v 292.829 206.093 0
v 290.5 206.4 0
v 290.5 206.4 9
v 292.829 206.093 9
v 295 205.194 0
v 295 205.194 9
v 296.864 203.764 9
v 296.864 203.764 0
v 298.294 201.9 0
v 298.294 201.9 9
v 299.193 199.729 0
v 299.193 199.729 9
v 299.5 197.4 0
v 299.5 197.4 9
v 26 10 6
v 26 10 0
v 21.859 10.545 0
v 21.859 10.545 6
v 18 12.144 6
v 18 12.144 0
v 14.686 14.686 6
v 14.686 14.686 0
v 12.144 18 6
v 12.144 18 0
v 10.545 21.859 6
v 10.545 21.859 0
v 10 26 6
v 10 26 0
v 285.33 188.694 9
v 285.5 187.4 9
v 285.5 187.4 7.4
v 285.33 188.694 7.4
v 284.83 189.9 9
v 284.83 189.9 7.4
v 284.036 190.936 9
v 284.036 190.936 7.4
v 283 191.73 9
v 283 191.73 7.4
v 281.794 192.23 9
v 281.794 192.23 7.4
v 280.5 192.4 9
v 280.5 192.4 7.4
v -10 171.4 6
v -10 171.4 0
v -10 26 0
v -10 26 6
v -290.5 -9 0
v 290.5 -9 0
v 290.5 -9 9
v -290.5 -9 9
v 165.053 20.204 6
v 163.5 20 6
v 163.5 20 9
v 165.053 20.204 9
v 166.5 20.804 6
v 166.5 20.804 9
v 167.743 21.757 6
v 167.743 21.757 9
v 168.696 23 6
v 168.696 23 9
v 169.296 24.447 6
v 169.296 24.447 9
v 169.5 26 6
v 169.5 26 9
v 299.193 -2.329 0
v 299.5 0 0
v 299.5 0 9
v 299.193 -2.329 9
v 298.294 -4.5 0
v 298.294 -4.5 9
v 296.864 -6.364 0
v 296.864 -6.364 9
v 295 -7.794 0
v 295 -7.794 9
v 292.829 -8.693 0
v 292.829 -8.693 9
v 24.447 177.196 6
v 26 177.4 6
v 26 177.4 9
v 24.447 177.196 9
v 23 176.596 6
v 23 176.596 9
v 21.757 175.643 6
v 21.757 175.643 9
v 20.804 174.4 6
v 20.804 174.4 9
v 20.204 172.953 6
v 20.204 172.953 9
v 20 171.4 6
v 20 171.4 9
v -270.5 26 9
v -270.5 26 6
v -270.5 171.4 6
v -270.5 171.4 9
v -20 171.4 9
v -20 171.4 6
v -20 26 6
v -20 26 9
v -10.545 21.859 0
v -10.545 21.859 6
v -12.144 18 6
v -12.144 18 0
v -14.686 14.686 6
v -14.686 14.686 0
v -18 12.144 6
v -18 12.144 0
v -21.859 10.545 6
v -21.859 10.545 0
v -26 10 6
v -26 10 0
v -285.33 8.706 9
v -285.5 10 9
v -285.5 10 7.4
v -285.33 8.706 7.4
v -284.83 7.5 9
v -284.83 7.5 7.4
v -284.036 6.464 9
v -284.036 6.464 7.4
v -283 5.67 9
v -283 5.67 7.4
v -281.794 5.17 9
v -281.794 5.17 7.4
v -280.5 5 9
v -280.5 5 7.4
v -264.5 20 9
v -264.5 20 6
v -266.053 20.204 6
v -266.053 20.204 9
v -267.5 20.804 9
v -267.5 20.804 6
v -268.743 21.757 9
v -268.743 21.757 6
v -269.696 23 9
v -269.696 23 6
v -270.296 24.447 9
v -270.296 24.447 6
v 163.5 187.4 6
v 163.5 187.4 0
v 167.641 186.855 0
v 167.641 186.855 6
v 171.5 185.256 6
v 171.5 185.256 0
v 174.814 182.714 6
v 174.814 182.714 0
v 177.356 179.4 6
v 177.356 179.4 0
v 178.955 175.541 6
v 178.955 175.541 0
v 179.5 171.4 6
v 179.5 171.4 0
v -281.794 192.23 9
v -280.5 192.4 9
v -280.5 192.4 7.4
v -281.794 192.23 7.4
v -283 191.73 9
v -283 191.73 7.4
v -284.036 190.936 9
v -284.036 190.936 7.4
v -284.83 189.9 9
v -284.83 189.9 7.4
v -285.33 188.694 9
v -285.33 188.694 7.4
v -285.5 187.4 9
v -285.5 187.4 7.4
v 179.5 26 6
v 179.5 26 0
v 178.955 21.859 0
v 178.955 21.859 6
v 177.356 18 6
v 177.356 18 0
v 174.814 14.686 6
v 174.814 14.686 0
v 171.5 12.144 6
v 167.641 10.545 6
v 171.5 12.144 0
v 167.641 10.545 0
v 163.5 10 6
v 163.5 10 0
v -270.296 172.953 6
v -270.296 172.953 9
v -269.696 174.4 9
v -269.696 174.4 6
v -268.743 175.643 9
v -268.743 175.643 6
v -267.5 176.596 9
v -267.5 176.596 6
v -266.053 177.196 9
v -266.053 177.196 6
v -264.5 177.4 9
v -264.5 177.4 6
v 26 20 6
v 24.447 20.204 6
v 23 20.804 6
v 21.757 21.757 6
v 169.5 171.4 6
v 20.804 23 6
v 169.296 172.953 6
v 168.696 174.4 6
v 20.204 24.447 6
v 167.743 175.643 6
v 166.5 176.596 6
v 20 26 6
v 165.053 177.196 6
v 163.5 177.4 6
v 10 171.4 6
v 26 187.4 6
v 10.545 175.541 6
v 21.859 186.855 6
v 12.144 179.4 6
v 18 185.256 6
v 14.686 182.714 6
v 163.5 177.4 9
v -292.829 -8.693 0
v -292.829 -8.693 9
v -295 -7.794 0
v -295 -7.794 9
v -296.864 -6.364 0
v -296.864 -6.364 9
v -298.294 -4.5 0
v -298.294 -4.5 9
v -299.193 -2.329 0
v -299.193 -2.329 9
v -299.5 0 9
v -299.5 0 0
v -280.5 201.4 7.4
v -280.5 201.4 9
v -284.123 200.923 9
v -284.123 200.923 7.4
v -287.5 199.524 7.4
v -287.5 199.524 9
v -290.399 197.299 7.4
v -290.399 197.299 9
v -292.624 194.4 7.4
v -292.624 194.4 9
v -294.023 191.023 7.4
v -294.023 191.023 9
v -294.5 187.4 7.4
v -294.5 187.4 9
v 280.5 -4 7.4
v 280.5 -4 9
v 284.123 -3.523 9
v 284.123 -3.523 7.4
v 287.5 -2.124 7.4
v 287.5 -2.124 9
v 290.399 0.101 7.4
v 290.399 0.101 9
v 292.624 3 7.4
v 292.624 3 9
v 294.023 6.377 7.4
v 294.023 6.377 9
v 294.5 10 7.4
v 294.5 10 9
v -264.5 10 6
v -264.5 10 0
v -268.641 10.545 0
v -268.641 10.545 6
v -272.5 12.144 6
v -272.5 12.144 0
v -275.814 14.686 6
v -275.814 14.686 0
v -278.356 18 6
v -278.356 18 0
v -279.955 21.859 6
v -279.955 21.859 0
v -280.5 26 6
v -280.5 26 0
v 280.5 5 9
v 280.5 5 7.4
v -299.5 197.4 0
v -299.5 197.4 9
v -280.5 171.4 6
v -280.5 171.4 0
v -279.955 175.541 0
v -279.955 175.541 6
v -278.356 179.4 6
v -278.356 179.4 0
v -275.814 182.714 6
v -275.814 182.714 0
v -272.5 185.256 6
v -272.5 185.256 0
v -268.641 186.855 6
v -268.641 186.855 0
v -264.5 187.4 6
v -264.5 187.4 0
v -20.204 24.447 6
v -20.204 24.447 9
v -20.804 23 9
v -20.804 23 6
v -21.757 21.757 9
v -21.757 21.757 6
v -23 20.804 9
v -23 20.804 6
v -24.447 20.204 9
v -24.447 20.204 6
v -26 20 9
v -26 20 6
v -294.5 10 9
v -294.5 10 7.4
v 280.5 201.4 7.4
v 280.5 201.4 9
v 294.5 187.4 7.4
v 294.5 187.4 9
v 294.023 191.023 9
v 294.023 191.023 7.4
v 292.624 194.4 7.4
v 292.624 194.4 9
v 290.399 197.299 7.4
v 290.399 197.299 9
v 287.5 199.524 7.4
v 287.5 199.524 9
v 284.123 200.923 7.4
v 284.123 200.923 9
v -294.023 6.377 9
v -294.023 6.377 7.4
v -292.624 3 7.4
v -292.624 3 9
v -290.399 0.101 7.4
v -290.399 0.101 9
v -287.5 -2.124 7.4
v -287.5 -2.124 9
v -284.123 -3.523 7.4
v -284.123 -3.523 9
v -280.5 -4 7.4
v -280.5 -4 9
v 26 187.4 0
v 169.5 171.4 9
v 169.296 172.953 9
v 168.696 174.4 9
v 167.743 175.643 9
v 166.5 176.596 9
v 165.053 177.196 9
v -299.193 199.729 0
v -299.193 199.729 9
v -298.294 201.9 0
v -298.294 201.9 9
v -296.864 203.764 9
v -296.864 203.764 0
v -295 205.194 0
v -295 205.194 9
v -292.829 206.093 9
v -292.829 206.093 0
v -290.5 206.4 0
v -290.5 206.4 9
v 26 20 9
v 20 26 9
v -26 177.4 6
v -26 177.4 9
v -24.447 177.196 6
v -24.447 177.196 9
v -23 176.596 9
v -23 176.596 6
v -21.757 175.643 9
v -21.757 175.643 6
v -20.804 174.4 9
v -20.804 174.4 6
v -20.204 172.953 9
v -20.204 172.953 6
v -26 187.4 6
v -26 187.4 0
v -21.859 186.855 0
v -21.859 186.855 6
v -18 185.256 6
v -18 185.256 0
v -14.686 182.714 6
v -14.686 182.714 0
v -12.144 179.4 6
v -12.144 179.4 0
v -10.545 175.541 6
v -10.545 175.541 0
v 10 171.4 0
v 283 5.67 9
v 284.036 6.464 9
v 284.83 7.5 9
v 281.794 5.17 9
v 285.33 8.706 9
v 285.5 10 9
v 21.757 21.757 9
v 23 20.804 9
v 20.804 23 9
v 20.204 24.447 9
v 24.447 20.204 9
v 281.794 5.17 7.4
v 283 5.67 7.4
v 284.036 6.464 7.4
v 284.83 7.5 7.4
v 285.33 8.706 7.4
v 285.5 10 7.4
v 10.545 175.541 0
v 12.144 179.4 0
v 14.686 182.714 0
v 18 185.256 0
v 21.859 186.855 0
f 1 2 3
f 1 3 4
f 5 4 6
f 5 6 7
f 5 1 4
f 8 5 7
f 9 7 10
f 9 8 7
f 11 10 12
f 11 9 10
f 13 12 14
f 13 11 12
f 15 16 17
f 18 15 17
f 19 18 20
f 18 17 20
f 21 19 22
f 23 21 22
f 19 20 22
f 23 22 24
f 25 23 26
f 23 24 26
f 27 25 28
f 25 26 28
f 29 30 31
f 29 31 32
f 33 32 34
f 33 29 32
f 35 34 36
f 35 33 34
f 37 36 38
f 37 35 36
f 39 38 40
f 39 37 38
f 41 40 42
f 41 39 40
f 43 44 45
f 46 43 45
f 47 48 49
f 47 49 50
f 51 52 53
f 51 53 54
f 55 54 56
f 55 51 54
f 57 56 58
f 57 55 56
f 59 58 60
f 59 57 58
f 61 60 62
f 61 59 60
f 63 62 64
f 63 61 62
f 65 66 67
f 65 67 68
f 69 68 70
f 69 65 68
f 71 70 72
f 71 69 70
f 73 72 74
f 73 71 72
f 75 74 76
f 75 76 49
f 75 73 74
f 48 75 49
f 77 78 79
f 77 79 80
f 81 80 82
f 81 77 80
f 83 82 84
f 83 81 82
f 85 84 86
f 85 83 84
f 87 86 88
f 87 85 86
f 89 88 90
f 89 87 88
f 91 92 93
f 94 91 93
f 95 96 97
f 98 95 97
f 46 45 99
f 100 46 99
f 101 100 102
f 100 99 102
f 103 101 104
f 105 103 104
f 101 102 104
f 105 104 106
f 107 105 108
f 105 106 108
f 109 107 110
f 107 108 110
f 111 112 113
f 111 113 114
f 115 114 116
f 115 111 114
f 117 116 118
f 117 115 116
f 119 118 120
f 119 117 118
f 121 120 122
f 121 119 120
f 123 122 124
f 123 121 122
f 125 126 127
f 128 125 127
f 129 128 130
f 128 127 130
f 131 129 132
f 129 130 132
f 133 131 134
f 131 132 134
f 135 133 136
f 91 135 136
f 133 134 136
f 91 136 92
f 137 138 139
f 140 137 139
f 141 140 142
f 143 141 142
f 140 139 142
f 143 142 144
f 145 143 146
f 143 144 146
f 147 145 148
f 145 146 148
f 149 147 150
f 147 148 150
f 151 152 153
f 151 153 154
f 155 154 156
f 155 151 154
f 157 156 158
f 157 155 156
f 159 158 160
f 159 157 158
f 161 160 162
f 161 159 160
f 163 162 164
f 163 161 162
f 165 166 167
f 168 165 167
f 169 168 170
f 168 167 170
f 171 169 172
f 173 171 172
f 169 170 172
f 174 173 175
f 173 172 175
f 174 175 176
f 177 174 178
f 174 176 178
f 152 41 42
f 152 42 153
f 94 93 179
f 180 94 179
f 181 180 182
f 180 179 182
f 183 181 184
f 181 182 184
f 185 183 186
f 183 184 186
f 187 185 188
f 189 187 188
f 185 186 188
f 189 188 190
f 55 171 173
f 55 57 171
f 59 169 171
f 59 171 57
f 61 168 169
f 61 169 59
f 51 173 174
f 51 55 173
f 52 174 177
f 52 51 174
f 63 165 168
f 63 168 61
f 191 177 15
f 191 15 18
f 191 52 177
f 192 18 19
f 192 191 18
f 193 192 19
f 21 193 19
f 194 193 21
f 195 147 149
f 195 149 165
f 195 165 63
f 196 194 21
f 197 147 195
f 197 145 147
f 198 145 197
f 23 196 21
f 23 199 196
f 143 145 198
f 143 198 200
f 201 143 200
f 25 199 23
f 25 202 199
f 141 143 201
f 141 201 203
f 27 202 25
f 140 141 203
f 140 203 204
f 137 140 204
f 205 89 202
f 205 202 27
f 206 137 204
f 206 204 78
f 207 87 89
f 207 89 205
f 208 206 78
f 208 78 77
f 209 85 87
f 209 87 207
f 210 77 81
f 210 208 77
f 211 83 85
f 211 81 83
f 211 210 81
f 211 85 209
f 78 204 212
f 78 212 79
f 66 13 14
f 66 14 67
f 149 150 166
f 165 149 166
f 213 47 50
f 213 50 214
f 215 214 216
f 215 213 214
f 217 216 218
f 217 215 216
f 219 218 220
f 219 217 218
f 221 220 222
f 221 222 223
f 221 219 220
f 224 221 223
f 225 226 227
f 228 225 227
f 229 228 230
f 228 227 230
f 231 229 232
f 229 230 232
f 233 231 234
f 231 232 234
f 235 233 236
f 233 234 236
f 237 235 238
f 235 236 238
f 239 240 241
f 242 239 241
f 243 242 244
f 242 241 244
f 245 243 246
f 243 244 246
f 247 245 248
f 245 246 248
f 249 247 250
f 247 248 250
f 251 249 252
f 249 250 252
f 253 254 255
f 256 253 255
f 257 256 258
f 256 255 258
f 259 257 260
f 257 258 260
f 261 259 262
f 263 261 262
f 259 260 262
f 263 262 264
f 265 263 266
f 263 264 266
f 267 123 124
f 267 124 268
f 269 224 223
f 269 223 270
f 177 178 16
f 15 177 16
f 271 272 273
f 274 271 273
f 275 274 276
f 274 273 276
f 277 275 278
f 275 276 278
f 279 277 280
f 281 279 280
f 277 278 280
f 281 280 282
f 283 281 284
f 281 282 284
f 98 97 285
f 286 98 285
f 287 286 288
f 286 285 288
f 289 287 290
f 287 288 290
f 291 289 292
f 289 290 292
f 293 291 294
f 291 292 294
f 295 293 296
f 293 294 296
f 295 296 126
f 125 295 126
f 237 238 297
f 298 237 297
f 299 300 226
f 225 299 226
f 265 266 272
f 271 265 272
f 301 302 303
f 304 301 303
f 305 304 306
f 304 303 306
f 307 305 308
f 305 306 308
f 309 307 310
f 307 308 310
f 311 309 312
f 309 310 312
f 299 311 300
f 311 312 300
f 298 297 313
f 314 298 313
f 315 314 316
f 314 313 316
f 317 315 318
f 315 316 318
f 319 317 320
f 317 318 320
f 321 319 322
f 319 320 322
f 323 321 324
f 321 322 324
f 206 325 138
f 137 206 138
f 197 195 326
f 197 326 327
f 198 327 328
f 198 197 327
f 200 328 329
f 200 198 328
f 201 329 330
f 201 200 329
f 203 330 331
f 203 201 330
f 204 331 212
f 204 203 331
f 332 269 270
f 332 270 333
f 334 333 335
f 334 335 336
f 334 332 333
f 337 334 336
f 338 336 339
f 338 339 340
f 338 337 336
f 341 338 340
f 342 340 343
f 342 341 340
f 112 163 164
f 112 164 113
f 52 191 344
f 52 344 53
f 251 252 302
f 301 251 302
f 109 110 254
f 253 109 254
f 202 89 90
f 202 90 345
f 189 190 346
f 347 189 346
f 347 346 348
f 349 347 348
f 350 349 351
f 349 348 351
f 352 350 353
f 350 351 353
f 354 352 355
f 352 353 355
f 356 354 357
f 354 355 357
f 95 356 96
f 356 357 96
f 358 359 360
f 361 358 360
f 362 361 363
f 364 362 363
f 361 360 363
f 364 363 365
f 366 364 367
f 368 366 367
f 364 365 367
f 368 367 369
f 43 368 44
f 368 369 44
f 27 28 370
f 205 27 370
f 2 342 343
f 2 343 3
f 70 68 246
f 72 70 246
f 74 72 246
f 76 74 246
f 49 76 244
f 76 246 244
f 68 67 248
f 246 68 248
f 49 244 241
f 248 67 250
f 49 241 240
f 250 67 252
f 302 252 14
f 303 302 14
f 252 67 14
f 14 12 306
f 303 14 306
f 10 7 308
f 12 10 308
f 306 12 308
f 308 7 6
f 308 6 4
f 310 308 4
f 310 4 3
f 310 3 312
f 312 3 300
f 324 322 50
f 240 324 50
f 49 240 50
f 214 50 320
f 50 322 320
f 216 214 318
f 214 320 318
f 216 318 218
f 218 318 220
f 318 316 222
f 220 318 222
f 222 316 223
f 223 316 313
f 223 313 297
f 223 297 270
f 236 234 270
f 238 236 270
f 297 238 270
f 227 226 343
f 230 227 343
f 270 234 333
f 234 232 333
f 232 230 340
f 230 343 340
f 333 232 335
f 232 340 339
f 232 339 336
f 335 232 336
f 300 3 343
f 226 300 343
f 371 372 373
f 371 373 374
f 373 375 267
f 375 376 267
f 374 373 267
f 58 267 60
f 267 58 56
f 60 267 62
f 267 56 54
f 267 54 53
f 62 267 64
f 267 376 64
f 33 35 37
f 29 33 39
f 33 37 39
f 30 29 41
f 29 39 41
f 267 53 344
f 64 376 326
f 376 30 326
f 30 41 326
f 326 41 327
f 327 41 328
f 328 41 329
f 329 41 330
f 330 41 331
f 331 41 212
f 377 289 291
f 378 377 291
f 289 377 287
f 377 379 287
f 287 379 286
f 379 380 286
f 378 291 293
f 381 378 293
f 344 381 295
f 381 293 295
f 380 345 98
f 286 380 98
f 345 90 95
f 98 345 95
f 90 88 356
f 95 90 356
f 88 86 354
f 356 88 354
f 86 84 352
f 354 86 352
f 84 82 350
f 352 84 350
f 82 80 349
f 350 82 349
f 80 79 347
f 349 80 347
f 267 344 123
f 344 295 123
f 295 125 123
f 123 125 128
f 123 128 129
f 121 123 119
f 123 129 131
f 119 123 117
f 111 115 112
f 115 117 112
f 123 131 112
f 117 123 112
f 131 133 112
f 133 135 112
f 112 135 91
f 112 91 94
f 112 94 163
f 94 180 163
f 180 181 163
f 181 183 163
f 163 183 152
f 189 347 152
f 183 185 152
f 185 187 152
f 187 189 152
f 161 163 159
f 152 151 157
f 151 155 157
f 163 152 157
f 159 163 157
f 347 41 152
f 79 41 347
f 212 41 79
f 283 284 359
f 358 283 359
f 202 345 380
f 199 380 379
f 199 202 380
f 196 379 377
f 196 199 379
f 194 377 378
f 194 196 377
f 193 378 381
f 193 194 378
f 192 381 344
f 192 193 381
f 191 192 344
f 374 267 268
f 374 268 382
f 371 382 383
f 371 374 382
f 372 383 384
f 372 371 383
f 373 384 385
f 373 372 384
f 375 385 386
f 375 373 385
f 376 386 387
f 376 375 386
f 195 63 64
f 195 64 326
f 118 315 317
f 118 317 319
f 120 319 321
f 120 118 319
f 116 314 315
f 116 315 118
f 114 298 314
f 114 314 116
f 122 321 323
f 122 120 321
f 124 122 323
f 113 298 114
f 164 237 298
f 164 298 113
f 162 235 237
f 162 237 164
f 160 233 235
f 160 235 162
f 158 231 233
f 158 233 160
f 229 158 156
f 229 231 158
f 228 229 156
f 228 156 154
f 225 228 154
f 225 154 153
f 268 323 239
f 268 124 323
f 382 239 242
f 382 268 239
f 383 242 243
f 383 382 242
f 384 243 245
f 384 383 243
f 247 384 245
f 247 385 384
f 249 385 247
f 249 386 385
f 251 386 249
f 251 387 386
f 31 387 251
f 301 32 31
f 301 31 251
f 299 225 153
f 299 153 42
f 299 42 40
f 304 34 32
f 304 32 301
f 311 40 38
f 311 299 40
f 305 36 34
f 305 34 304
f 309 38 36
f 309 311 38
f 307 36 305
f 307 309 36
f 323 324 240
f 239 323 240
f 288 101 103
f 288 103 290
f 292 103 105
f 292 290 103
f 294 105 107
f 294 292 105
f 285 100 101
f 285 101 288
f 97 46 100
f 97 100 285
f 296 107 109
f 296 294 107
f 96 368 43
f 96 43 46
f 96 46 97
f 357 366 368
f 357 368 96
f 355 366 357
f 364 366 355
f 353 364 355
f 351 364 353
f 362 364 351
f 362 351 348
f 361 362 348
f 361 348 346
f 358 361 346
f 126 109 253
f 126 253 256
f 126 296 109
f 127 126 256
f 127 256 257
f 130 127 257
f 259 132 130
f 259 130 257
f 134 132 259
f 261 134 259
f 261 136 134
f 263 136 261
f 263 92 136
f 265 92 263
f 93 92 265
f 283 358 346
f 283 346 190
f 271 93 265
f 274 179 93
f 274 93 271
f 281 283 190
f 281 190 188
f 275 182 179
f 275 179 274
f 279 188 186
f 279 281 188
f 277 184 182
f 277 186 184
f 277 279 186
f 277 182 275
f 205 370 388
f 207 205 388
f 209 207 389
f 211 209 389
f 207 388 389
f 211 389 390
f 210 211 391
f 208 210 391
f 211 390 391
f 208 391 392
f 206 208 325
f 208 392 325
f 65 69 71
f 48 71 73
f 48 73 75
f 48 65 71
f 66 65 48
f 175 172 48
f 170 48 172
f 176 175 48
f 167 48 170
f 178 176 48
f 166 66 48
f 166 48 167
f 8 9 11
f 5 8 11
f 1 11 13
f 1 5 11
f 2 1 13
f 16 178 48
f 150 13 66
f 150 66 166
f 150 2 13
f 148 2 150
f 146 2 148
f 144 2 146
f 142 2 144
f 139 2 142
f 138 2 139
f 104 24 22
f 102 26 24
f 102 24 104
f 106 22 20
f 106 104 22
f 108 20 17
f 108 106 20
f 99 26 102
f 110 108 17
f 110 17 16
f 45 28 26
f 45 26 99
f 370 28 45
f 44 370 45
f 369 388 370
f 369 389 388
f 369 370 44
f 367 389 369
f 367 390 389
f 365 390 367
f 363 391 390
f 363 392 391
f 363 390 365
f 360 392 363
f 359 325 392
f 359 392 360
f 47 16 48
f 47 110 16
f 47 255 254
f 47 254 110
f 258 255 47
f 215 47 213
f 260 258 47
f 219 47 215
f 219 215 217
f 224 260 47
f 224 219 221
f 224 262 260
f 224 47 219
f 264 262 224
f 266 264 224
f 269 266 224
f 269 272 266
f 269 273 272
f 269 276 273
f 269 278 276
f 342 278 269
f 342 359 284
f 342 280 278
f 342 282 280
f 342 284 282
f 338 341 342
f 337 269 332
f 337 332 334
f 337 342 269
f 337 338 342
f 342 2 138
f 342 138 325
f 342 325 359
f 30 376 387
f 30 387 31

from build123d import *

# Parameters (mm, degrees)
BOSS_EXTRUDE1_DEPTH = 9
CUT_EXTRUDE1_DEPTH  = 1.6
CUT_EXTRUDE2_DEPTH  = 9
CUT_EXTRUDE4_DEPTH  = 6


with BuildPart() as part:
    # Sketch1 → Boss-Extrude1 (new body)
    with BuildSketch(Plane.XY):
        with BuildLine():
            Line((-290.5, 206.4), (290.5, 206.4))
            ThreePointArc((290.5, 206.4), (296.863961031, 203.763961031), (299.5, 197.4))
            Line((299.5, 197.4), (299.5, 0))
            ThreePointArc((299.5, 0), (296.863961031, -6.363961031), (290.5, -9))
            Line((290.5, -9), (-290.5, -9))
            ThreePointArc((-290.5, -9), (-296.863961031, -6.363961031), (-299.5, 0))
            Line((-299.5, 0), (-299.5, 197.4))
            ThreePointArc((-299.5, 197.4), (-296.863961031, 203.763961031), (-290.5, 206.4))
        make_face()
    extrude(amount=BOSS_EXTRUDE1_DEPTH)

    # Sketch4 → Cut-Extrude1 (cut)
    with BuildSketch(Plane.XY.offset(9)):
        with BuildLine():
            Line((-280.5, -4), (280.5, -4))
            ThreePointArc((280.5, -4), (290.399494937, 0.100505063), (294.5, 10))
            Line((294.5, 10), (294.5, 187.4))
            ThreePointArc((294.5, 187.4), (290.399494937, 197.299494937), (280.5, 201.4))
            Line((280.5, 201.4), (-280.5, 201.4))
            ThreePointArc((-280.5, 201.4), (-290.399494937, 197.299494937), (-294.5, 187.4))
            Line((-294.5, 187.4), (-294.5, 10))
            ThreePointArc((-294.5, 10), (-290.399494937, 0.100505063), (-280.5, -4))
        make_face()
        with BuildLine():
            Line((-280.5, 5), (280.5, 5))
            ThreePointArc((280.5, 5), (284.035533906, 6.464466094), (285.5, 10))
            Line((285.5, 10), (285.5, 187.4))
            ThreePointArc((285.5, 187.4), (284.035533906, 190.935533906), (280.5, 192.4))
            Line((280.5, 192.4), (-280.5, 192.4))
            ThreePointArc((-280.5, 192.4), (-284.035533906, 190.935533906), (-285.5, 187.4))
            Line((-285.5, 187.4), (-285.5, 10))
            ThreePointArc((-285.5, 10), (-284.035533906, 6.464466094), (-280.5, 5))
        make_face(mode=Mode.SUBTRACT)
    extrude(amount=-CUT_EXTRUDE1_DEPTH, mode=Mode.SUBTRACT)

    # Sketch5 → Cut-Extrude2 (cut)
    with BuildSketch(Plane.XY):
        with BuildLine():
            Line((-264.5, 177.4), (-26, 177.4))
            ThreePointArc((-26, 177.4), (-21.757359313, 175.642640687), (-20, 171.4))
            Line((-20, 171.4), (-20, 26))
            ThreePointArc((-20, 26), (-21.757359313, 21.757359313), (-26, 20))
            Line((-26, 20), (-264.5, 20))
            ThreePointArc((-264.5, 20), (-268.742640687, 21.757359313), (-270.5, 26))
            Line((-270.5, 26), (-270.5, 171.4))
            ThreePointArc((-270.5, 171.4), (-268.742640687, 175.642640687), (-264.5, 177.4))
        make_face()
        with BuildLine():
            Line((20, 171.4), (20, 26))
            ThreePointArc((20, 26), (21.757359313, 21.757359313), (26, 20))
            Line((26, 20), (163.5, 20))
            ThreePointArc((163.5, 20), (167.742640687, 21.757359313), (169.5, 26))
            Line((169.5, 26), (169.5, 171.4))
            ThreePointArc((169.5, 171.4), (167.742640687, 175.642640687), (163.5, 177.4))
            Line((163.5, 177.4), (26, 177.4))
            ThreePointArc((26, 177.4), (21.757359313, 175.642640687), (20, 171.4))
        make_face()
    extrude(amount=CUT_EXTRUDE2_DEPTH, mode=Mode.SUBTRACT)

    # Sketch7 → Cut-Extrude4 (cut)
    with BuildSketch(Plane(origin=(0, 0, 0), x_dir=(-1, 0, 0), z_dir=(0, 0, -1))):
        with BuildLine():
            Line((280.5, 26), (280.5, 171.4))
            ThreePointArc((280.5, 171.4), (275.813708499, 182.713708499), (264.5, 187.4))
            Line((264.5, 187.4), (26, 187.4))
            ThreePointArc((26, 187.4), (14.686291501, 182.713708499), (10, 171.4))
            Line((10, 171.4), (10, 26))
            ThreePointArc((10, 26), (14.686291501, 14.686291501), (26, 10))
            Line((26, 10), (264.5, 10))
            ThreePointArc((264.5, 10), (275.813708499, 14.686291501), (280.5, 26))
        make_face()
        with BuildLine():
            Line((-163.5, 10), (-26, 10))
            ThreePointArc((-26, 10), (-14.686291501, 14.686291501), (-10, 26))
            Line((-10, 26), (-10, 171.4))
            ThreePointArc((-10, 171.4), (-14.686291501, 182.713708499), (-26, 187.4))
            Line((-26, 187.4), (-163.5, 187.4))
            ThreePointArc((-163.5, 187.4), (-174.813708499, 182.713708499), (-179.5, 171.4))
            Line((-179.5, 171.4), (-179.5, 26))
            ThreePointArc((-179.5, 26), (-174.813708499, 14.686291501), (-163.5, 10))
        make_face()
    extrude(amount=-CUT_EXTRUDE4_DEPTH, mode=Mode.SUBTRACT)


solid = part.part
